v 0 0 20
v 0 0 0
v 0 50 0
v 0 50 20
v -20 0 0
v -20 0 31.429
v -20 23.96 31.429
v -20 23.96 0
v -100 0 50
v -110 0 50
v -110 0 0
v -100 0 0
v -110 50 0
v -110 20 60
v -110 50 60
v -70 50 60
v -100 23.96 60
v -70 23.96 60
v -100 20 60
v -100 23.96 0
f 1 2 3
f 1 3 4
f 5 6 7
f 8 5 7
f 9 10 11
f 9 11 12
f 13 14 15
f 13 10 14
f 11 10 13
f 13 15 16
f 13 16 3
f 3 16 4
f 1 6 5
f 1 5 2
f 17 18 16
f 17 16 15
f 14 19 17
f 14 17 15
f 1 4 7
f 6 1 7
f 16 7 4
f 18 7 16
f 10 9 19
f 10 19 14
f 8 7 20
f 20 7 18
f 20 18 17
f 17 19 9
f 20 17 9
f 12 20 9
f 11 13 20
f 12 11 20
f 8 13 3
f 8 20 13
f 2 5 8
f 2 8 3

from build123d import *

# Parameters (mm, degrees)
F1_DEPTH = 50
F2_W     = 50
F2_H     = 23.9603407681
F3_DEPTH = 60.001
F4_SIZE2 = 10
F4_SIZE  = 20


with BuildPart() as f1:
    # F0 (on Front) → F1 (new body)
    with BuildSketch(Plane.XZ):
        Polygon((-110, 0), (0, 0), (0, 20), (-70, 60), (-110, 60), align=None)
    extrude(amount=-F1_DEPTH)

    # F2 (on face) → F3 (cut, through all)
    with BuildSketch(Plane.XY.offset(60)):
        Polygon((-100, 20), (-100, 0), (-70, 0), (-70, 23.9603407681), (-100, 23.9603407681), align=None)
        with Locations((-45, 11.980170384)):
            Rectangle(F2_W, F2_H)
    extrude(amount=-F3_DEPTH, mode=Mode.SUBTRACT)

    # F4
    f4_edges = [f1.edges().sort_by_distance(p)[0] for p in [
        (-105, 0, 60),
    ]]
    f4_side = f1.faces().sort_by_distance((-92.805245, 32.304762, 60))[0]
    chamfer(f4_edges, length=F4_SIZE, length2=F4_SIZE2, reference=f4_side)


solid = f1.part
